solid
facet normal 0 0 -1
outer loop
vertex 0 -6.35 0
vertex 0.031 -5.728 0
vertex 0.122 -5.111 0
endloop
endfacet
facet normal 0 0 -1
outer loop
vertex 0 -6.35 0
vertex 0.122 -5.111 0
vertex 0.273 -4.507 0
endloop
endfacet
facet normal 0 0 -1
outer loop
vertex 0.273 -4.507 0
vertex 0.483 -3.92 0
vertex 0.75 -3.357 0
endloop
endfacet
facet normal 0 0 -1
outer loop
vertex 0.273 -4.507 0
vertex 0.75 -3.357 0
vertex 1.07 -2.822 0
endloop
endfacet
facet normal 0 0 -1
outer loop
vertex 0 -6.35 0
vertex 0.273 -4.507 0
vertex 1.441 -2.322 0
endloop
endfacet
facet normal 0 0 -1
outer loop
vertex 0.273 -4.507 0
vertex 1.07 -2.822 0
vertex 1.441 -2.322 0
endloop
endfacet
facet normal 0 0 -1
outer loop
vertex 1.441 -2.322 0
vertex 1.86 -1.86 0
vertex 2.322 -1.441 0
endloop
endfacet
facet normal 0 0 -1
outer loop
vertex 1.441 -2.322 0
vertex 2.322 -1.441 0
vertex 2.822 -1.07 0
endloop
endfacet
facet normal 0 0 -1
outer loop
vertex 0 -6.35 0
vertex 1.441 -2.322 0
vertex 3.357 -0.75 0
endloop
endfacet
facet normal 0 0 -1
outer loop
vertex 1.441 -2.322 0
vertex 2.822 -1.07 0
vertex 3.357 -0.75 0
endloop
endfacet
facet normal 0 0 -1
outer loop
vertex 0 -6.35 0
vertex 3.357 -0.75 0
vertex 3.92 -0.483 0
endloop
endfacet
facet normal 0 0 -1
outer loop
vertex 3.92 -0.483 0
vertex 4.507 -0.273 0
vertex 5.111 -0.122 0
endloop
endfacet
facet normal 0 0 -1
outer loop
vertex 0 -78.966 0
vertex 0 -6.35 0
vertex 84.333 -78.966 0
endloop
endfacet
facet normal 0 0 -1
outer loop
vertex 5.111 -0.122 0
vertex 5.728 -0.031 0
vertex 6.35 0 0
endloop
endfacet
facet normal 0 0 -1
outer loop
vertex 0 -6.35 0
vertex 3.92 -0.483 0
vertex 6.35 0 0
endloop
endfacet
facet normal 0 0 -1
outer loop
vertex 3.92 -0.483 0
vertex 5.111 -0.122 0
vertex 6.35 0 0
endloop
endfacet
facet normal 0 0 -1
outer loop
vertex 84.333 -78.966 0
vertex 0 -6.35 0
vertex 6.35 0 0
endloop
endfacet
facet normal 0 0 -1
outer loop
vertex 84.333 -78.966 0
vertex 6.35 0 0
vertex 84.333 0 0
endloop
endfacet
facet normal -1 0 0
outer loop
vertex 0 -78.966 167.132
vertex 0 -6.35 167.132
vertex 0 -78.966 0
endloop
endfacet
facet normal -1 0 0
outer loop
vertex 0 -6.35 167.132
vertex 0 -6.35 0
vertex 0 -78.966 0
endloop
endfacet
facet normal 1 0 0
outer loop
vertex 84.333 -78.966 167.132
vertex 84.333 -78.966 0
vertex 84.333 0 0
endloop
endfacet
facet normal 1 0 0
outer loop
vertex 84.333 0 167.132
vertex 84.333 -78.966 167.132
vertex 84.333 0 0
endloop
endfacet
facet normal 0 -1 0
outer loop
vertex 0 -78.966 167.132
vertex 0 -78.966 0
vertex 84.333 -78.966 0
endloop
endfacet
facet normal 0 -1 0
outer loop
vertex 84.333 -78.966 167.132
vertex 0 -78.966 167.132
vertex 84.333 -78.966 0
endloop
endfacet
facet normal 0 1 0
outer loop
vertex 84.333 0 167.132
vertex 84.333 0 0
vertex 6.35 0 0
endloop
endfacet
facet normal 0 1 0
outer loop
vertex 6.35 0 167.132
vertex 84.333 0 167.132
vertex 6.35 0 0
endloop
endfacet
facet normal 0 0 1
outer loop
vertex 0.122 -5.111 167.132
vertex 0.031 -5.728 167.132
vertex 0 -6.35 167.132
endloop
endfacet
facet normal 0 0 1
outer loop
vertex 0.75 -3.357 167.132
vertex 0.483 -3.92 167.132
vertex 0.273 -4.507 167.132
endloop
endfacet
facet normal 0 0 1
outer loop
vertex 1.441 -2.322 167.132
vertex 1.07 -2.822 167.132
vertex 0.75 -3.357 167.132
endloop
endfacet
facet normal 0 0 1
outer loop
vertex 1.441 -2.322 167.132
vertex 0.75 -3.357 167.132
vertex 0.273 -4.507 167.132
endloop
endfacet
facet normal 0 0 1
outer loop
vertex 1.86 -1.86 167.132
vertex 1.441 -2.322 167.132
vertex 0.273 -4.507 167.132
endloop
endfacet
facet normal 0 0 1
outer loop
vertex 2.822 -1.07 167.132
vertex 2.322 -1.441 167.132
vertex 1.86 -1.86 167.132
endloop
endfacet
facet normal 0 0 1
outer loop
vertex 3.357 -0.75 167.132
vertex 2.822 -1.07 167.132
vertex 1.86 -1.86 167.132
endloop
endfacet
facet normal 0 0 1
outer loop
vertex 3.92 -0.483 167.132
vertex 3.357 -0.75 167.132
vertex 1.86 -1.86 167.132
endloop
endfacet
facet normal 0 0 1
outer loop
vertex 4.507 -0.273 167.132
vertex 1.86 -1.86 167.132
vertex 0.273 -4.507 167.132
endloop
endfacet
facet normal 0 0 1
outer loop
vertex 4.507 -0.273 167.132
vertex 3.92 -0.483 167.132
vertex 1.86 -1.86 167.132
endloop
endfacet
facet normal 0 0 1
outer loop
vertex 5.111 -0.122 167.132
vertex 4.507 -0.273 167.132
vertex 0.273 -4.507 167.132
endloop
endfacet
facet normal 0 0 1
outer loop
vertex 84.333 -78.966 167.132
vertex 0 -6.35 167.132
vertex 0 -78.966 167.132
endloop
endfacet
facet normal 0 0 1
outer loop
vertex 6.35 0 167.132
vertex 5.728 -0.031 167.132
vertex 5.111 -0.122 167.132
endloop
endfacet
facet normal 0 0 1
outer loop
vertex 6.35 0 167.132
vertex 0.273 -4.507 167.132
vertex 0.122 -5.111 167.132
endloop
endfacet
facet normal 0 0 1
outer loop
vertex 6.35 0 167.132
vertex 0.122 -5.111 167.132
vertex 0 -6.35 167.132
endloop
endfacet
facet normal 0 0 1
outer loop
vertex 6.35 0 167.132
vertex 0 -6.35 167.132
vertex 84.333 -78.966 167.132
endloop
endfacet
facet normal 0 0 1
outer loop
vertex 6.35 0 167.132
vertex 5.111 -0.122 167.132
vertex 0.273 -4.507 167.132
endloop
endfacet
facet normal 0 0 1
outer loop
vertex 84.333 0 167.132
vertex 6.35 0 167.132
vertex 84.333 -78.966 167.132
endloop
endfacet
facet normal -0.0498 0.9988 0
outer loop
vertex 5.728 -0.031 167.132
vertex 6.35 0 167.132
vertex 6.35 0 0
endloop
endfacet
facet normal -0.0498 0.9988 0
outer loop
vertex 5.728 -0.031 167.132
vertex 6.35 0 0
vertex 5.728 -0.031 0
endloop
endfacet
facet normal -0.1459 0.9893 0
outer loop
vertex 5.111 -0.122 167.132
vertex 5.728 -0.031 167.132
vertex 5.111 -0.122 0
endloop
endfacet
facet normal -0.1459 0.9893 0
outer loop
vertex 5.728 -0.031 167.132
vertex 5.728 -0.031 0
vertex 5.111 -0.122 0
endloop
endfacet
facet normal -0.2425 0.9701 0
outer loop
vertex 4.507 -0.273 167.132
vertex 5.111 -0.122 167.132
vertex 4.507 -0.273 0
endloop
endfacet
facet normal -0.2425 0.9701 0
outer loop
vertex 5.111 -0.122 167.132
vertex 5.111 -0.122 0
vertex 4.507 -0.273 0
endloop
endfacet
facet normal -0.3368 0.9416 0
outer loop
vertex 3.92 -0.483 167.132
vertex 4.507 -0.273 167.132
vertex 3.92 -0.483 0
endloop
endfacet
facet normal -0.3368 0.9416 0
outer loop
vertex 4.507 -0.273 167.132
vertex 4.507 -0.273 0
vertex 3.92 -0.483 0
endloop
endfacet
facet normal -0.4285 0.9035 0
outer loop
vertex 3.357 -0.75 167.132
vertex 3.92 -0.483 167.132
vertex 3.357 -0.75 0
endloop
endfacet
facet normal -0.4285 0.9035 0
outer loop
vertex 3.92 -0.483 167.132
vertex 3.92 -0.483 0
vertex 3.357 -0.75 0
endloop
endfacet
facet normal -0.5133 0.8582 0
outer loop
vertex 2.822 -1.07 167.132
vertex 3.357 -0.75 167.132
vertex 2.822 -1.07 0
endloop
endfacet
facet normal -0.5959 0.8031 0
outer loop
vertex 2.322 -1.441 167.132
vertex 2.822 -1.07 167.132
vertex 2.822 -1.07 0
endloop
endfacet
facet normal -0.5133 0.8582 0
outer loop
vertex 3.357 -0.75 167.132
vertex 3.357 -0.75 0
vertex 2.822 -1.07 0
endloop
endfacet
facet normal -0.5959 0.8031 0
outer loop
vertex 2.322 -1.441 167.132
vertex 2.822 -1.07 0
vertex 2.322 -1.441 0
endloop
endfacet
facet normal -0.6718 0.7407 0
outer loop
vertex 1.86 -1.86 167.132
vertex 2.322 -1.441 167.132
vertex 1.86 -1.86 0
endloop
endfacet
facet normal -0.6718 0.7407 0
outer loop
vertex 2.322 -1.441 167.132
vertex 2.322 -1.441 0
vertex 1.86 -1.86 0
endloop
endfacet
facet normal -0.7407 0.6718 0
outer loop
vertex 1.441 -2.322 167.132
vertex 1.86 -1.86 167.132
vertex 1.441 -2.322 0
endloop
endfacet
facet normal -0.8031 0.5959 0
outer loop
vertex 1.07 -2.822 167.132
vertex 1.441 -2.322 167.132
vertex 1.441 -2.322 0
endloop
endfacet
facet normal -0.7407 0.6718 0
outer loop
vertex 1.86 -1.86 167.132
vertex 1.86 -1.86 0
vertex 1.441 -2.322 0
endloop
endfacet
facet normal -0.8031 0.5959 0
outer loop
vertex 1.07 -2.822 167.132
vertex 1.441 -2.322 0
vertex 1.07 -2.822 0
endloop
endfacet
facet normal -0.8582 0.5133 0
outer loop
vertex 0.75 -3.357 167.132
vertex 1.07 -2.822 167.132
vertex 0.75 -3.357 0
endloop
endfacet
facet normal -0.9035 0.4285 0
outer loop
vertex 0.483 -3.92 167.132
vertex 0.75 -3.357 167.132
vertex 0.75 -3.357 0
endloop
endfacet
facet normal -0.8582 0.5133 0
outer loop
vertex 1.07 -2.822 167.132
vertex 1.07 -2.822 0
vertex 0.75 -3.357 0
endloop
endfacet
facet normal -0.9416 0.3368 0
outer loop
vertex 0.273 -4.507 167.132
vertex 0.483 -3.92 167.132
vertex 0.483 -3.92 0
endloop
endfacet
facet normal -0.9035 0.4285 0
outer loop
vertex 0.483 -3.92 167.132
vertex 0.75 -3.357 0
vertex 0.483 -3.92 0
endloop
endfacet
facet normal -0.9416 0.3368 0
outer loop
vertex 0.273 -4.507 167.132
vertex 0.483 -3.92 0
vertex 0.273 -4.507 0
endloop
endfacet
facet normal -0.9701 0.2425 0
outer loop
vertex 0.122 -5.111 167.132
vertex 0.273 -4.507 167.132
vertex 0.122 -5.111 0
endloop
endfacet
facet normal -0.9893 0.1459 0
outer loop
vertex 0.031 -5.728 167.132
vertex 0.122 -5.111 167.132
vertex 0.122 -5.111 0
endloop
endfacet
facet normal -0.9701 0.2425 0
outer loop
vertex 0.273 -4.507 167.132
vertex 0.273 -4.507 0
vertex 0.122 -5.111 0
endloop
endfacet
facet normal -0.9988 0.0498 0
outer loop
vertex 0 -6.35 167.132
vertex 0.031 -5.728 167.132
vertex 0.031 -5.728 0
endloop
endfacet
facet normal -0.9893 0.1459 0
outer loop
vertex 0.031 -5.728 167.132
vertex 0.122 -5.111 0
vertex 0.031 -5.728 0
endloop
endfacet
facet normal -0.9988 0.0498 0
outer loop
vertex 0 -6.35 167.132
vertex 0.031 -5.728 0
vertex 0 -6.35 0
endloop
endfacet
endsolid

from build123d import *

# Parameters (mm, degrees)
F1_DEPTH = 50.8
F2_DEPTH = 116.332


with BuildPart() as f1:
    # F0 (on Top) → F1 (new body)
    with BuildSketch(Plane.XY):
        with BuildLine():
            Line((84.332854, 0), (6.35, 0))
            ThreePointArc((6.35, 0), (1.859872, -1.859872), (0, -6.35))
            Line((0, -6.35), (0, -78.965932))
            Line((0, -78.965932), (84.332854, -78.965932))
            Line((84.332854, -78.965932), (84.332854, 0))
        make_face()
    extrude(amount=F1_DEPTH)

    # F1_face (on face) → F2 (join)
    with BuildSketch(Plane(origin=(42.219444, -39.532492, 50.8), x_dir=(1, 0, 0), z_dir=(0, 0, 1))):
        with BuildLine():
            Line((42.11341, 39.532492), (-35.869444, 39.532492))
            ThreePointArc((-35.869444, 39.532492), (-40.359572, 37.67262), (-42.219444, 33.182492))
            Line((-42.219444, 33.182492), (-42.219444, -39.43344))
            Line((-42.219444, -39.43344), (42.11341, -39.43344))
            Line((42.11341, -39.43344), (42.11341, 39.532492))
        make_face()
    extrude(amount=F2_DEPTH)


solid = f1.part
